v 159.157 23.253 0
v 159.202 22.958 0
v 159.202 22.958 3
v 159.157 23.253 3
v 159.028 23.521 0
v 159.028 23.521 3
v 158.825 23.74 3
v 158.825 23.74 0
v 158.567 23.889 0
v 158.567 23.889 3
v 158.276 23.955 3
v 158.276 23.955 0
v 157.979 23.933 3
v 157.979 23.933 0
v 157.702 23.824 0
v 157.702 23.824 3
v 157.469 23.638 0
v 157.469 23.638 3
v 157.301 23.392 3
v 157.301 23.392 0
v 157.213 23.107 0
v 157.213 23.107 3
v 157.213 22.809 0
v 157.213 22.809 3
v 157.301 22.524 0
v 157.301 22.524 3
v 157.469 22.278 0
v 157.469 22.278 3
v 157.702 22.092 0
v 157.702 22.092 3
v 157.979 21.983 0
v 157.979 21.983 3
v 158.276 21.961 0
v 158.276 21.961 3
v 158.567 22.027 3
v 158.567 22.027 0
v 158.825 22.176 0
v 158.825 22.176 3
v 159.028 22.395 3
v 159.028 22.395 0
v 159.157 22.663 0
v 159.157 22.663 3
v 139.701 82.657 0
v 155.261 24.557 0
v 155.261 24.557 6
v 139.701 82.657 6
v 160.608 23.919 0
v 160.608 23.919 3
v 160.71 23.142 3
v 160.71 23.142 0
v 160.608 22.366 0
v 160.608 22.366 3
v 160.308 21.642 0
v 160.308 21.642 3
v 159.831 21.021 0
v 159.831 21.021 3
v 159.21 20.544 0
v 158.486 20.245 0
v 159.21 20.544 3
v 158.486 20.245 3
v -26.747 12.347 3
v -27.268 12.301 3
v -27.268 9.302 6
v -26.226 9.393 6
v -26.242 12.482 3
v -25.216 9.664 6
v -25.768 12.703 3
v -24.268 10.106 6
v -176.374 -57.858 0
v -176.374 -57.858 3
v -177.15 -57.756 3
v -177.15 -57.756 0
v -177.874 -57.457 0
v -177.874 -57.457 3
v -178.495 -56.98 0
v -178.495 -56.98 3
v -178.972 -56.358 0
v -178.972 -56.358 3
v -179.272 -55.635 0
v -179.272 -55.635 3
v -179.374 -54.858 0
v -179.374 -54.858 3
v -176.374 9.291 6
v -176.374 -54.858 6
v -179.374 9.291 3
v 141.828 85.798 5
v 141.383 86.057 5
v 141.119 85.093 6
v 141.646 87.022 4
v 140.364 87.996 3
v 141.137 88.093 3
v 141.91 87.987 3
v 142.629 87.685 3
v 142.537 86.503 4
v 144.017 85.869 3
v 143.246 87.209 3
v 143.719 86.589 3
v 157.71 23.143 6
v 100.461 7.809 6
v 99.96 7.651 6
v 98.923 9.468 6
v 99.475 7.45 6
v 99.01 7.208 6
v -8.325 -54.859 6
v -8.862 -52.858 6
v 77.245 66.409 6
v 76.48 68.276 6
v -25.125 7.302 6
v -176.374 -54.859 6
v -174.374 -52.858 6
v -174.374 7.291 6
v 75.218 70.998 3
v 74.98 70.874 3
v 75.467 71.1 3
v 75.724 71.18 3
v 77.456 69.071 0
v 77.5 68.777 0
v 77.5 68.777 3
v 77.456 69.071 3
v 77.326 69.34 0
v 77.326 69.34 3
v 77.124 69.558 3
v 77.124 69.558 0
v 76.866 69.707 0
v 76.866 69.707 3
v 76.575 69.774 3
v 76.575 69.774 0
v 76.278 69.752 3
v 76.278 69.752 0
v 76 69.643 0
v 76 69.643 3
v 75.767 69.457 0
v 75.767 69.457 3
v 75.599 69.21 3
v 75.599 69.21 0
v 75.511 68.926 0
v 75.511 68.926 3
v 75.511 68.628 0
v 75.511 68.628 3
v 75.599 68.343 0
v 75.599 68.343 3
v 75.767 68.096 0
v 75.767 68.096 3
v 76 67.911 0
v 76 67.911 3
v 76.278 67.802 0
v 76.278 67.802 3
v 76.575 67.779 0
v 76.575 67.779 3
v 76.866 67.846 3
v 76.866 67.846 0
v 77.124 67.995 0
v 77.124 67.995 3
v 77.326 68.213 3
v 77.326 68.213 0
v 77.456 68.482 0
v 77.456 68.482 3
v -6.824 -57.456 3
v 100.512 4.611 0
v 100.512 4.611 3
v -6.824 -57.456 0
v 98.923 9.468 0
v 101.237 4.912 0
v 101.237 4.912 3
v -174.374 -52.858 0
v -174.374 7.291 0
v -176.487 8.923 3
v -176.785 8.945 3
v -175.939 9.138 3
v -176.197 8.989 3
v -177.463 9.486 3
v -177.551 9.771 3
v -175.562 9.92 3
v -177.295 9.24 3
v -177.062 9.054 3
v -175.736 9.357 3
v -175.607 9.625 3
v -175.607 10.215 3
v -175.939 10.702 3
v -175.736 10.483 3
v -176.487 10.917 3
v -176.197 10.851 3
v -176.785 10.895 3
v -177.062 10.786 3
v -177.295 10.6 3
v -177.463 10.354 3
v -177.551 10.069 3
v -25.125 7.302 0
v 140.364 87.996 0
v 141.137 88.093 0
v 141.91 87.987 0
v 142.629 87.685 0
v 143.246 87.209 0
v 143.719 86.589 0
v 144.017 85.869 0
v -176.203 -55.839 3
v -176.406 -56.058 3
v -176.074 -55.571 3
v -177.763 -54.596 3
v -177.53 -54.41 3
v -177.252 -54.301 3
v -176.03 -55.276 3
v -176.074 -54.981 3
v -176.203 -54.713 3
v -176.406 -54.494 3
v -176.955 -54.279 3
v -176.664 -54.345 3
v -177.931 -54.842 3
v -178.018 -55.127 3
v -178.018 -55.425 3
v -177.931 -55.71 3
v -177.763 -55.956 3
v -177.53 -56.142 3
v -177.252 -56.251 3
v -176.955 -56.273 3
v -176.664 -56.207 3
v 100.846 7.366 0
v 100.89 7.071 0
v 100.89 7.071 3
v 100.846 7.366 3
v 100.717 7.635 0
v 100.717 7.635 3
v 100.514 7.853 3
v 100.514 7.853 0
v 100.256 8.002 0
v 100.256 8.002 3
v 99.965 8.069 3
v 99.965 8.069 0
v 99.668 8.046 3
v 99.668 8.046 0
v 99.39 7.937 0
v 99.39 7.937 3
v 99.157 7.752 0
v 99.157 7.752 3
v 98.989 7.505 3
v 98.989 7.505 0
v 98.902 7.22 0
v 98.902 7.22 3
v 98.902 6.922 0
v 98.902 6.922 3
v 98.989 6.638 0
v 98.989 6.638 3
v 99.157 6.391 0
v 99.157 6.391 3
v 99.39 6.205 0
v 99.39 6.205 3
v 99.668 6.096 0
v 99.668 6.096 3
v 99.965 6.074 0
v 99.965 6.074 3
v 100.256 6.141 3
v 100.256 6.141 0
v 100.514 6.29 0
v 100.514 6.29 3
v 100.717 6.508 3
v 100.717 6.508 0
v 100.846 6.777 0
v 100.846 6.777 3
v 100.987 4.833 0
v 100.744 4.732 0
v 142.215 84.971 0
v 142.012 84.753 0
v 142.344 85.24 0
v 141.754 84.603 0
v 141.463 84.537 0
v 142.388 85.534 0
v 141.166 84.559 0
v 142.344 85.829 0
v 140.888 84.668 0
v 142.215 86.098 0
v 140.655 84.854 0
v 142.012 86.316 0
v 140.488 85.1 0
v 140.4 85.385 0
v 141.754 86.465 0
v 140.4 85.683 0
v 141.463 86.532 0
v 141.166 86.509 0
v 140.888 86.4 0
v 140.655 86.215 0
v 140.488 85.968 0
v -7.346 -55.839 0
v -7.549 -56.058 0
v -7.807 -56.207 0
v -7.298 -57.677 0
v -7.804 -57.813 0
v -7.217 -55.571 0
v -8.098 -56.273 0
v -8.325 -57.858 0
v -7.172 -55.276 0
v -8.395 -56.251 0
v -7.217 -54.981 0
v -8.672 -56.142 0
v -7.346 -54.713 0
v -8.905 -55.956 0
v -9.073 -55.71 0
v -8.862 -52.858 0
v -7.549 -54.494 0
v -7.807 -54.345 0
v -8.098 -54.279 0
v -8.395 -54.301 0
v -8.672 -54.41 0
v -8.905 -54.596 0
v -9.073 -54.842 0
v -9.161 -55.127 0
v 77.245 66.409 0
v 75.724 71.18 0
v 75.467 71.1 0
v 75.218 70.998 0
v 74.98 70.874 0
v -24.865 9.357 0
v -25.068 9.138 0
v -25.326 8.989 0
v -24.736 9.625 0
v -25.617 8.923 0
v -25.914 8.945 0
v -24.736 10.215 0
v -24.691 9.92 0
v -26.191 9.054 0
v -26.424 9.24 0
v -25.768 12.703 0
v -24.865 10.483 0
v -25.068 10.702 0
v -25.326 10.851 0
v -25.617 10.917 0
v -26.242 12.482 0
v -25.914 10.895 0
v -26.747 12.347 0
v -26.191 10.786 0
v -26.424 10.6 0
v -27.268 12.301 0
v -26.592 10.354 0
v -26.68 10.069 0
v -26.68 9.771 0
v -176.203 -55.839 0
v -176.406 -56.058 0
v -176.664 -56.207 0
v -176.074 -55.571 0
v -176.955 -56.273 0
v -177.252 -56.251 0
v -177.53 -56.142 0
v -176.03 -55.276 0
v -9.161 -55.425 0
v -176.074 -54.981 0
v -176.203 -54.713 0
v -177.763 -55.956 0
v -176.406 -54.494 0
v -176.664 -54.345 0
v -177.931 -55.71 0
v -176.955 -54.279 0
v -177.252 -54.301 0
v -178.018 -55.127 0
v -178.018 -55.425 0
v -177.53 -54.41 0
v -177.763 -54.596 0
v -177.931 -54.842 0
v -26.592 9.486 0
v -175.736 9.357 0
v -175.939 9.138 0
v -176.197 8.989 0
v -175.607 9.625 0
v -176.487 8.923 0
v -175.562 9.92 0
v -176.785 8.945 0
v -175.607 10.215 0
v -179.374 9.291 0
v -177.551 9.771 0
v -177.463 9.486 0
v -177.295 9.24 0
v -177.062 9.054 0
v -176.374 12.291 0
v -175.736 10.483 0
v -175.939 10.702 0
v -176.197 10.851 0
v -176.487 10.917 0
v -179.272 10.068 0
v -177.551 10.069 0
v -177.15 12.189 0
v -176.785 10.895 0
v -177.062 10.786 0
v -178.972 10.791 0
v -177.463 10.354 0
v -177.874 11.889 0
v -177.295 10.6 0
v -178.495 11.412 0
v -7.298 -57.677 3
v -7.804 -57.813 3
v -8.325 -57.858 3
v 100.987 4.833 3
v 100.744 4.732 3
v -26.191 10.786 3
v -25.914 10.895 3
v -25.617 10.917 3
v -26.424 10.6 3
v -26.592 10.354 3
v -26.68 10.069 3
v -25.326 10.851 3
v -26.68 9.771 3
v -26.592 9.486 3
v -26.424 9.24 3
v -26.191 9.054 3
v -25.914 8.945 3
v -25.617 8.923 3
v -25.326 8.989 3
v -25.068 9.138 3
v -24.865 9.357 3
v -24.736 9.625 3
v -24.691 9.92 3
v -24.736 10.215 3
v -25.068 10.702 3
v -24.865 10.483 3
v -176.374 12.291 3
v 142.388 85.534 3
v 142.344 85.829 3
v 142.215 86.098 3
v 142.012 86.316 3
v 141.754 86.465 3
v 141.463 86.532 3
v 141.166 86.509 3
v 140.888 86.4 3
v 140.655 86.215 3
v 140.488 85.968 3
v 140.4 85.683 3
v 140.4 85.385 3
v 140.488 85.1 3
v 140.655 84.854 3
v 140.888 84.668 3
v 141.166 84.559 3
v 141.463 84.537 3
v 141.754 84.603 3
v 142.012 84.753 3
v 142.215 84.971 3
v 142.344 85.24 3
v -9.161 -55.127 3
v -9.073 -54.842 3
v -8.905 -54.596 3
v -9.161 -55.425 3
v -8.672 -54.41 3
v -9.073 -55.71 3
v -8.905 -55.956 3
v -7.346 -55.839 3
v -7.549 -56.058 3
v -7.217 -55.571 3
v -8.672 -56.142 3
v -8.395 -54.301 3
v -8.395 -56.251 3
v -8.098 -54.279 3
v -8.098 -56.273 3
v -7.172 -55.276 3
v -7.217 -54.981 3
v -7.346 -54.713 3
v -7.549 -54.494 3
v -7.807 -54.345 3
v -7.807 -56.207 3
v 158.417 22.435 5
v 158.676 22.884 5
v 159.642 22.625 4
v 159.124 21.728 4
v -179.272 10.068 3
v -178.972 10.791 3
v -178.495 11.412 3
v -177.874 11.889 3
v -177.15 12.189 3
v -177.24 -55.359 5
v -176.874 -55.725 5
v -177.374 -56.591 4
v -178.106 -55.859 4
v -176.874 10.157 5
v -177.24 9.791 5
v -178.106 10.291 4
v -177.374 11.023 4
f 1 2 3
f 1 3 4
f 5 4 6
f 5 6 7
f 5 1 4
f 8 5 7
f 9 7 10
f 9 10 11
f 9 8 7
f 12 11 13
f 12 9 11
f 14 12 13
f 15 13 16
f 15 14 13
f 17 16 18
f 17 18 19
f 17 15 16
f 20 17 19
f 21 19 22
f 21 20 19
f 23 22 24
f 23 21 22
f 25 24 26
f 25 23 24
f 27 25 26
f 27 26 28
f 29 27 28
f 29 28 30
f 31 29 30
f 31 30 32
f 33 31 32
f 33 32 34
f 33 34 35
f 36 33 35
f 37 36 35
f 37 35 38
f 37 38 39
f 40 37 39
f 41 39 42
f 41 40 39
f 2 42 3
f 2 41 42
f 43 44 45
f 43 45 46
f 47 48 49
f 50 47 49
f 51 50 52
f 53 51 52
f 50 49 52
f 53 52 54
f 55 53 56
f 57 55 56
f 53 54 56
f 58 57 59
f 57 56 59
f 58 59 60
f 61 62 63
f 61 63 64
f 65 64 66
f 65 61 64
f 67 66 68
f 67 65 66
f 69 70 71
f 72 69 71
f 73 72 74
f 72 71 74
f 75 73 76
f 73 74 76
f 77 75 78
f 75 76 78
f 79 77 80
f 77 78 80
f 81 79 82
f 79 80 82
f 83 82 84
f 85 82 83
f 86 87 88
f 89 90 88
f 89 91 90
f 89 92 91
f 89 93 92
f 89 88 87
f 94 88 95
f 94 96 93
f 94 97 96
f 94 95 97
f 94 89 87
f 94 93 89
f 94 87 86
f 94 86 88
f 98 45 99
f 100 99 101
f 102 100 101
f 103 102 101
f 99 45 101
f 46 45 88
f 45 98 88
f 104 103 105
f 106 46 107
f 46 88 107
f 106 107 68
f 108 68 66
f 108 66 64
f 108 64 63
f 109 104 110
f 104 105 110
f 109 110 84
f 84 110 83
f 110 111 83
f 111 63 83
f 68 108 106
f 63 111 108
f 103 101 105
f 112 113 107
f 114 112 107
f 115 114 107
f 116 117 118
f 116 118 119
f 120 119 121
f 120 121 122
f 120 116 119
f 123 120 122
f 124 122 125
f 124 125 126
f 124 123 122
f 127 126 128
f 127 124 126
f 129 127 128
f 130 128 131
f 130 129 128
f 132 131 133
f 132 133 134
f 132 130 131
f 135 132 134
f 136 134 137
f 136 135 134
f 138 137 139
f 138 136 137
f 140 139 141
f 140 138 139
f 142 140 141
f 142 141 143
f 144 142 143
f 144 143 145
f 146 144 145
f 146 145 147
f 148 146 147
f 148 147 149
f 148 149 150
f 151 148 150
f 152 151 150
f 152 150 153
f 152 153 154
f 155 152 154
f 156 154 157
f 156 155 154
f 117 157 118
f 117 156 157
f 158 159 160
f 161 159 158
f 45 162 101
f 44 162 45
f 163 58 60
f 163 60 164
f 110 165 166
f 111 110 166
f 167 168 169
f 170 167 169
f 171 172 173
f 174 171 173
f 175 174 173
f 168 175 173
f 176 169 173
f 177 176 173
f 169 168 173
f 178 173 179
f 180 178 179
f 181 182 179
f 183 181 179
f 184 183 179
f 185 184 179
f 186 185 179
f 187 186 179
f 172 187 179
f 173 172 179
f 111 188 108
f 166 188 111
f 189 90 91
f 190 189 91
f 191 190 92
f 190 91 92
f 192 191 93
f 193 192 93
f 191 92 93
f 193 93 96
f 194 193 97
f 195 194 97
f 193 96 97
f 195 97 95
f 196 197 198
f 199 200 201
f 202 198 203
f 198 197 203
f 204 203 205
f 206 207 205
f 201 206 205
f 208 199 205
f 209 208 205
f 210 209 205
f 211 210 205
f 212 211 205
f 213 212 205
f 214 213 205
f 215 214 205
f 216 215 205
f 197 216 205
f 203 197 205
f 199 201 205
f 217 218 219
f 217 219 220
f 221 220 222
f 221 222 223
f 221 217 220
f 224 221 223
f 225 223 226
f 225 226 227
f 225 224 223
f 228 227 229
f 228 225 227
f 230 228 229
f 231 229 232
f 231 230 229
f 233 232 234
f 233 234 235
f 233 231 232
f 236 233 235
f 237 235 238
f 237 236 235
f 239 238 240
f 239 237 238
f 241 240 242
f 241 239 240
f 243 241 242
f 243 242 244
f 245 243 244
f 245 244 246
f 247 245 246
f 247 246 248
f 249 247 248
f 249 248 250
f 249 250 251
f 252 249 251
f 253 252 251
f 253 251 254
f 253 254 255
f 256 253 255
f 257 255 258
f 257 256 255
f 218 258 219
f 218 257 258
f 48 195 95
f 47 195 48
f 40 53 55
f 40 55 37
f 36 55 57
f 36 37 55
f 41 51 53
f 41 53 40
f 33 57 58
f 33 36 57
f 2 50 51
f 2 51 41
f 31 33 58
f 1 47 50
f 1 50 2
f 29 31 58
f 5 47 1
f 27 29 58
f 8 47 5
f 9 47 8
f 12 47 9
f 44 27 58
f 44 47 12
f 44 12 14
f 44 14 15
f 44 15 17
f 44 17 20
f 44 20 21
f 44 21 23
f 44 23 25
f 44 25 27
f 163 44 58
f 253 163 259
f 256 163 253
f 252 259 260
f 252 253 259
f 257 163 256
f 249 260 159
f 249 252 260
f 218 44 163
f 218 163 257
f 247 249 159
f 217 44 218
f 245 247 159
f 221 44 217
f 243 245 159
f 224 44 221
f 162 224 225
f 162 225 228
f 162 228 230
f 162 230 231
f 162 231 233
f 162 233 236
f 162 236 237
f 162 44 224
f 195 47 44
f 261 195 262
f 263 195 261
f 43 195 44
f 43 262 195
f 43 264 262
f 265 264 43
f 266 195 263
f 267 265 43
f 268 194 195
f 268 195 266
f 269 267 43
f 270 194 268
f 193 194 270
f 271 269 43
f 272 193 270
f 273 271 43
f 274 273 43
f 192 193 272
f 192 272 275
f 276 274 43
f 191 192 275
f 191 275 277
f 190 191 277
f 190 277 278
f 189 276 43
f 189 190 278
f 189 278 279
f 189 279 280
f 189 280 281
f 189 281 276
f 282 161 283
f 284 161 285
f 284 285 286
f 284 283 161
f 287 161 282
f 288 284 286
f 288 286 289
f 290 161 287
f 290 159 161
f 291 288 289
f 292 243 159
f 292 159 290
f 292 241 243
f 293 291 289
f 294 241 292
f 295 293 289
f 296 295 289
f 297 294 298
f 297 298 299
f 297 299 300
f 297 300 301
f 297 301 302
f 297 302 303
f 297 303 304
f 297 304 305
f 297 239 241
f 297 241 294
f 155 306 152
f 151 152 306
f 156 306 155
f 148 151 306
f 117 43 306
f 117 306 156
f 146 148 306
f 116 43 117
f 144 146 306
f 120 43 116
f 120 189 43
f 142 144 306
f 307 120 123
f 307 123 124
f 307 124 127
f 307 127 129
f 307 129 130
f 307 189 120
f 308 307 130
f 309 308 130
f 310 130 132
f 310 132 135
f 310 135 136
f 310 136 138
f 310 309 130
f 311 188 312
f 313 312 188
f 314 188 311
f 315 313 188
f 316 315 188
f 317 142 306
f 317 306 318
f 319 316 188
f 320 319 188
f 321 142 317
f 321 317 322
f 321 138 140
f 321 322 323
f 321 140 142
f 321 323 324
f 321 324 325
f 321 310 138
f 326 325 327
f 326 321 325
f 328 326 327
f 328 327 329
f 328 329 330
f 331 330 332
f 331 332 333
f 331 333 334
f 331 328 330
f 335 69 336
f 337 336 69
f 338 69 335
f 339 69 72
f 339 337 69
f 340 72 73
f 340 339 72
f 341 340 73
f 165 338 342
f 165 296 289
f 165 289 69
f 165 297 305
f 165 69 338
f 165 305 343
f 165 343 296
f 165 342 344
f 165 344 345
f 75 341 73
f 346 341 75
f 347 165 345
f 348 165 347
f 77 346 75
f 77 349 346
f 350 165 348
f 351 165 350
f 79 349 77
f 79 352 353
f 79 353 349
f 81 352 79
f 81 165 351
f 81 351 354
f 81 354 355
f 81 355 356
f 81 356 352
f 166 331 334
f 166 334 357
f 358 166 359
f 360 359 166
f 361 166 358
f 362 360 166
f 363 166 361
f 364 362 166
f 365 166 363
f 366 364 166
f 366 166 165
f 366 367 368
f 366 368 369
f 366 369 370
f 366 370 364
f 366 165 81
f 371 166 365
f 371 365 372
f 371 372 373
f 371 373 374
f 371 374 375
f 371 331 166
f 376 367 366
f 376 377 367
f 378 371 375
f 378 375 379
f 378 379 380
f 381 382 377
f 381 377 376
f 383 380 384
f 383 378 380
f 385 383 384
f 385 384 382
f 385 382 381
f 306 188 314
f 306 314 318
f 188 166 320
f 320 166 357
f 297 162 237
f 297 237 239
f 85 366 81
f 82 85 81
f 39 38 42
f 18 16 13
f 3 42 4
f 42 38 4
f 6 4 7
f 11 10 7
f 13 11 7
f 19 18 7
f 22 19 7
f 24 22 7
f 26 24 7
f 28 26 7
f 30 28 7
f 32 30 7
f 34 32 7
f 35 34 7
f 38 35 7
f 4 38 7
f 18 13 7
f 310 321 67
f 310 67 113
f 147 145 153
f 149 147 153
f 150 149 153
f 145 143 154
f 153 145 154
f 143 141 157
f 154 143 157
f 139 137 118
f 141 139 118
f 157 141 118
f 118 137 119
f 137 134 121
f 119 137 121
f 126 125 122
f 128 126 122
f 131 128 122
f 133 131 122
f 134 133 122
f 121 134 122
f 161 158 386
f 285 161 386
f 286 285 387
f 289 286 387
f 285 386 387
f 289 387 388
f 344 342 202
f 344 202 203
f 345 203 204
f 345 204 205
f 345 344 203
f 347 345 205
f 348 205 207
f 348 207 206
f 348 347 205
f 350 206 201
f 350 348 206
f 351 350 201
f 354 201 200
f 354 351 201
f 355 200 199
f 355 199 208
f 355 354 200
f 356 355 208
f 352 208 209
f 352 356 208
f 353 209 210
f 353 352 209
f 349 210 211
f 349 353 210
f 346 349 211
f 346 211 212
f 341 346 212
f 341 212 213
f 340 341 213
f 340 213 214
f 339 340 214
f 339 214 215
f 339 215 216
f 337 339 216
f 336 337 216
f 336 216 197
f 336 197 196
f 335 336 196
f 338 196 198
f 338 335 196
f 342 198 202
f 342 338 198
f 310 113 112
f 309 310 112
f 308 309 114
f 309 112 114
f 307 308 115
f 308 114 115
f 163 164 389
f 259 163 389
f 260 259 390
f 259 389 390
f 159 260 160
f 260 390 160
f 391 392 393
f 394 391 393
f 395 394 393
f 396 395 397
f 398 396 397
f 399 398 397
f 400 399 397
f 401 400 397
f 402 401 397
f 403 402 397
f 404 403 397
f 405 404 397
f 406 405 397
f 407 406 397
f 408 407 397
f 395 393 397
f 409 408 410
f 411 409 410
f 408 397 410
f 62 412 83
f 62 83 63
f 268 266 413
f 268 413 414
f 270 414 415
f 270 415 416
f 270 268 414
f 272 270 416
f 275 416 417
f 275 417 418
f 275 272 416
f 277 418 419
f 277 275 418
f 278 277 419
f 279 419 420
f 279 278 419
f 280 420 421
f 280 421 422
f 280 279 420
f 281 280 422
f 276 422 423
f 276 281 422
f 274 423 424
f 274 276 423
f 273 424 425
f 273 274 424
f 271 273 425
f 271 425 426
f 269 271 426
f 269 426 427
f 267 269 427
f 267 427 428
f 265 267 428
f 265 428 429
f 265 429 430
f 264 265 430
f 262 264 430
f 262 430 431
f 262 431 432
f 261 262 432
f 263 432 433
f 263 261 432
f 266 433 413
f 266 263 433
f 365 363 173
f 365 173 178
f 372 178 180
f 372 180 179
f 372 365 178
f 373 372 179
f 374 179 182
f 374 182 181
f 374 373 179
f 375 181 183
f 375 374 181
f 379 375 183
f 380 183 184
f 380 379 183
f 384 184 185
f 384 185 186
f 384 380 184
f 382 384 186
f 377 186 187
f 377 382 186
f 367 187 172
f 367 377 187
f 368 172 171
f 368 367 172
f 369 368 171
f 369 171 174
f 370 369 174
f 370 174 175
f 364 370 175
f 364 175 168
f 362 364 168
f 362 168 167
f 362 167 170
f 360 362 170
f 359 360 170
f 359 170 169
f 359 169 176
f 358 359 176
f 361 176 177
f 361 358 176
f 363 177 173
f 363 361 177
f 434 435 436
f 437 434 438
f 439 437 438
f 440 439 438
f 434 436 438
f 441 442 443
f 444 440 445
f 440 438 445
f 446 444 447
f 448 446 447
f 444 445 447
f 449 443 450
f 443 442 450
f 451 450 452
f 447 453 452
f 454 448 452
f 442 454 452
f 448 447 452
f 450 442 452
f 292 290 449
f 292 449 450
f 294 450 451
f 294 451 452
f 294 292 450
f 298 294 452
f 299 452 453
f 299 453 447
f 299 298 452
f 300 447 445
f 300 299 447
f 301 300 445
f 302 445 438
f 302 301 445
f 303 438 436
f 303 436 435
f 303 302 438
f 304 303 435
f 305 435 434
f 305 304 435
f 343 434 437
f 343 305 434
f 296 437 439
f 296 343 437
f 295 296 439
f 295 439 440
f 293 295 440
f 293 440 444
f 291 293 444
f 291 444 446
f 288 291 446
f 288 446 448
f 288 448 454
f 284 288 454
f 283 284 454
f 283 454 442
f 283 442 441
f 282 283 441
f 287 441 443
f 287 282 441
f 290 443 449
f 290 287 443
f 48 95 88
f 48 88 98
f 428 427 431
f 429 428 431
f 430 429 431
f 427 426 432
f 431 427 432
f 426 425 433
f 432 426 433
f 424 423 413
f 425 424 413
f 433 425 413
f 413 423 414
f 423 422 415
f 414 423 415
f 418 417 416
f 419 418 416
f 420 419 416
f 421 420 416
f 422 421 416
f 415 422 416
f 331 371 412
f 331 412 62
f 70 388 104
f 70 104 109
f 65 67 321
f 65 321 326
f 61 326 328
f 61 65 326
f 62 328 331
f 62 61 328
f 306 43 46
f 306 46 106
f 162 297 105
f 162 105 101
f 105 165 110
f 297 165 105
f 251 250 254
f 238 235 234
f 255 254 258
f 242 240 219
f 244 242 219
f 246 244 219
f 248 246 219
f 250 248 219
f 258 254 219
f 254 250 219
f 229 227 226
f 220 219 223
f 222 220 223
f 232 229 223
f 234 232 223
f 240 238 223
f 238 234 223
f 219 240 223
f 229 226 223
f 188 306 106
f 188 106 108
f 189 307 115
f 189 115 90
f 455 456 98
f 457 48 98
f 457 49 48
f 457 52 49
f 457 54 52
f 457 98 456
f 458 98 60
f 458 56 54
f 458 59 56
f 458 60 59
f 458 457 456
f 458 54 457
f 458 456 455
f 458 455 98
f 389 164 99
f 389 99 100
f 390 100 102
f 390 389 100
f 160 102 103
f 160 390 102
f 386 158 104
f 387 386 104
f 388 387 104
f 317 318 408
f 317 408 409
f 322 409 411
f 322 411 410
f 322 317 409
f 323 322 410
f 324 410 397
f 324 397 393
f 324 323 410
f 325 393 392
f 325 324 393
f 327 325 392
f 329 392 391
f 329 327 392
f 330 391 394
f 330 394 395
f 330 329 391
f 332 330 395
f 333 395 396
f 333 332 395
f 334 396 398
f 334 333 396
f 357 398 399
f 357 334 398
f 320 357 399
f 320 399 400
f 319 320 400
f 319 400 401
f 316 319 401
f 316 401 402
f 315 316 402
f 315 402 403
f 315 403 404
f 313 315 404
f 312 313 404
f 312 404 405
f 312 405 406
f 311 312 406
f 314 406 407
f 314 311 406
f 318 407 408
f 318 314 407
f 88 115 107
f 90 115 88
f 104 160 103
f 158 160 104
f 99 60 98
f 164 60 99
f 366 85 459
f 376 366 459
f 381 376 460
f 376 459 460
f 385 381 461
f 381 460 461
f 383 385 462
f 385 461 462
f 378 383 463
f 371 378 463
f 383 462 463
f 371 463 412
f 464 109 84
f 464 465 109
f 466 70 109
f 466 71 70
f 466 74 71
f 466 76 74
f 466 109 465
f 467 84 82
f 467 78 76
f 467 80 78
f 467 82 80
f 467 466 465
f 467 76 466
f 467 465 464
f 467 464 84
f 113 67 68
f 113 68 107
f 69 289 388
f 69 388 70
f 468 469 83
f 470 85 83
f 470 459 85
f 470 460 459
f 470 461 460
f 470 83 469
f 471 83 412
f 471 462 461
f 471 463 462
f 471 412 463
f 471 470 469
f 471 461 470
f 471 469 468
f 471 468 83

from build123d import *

# Parameters (mm, degrees)
BOSS_EXTRU_1_DEPTH      = 6
CONG_1_R                = 3
ESQUISSE2_R             = 1
ENL_V_MAT_EXTRU_1_DEPTH = 3
CHANFREIN1_SIZE         = 3


with BuildPart() as part:
    # Esquisse1 → Boss.-Extru.1 (new body)
    with BuildSketch(Plane.XY):
        Polygon((-26.464533767, 12.30154537), (75.33141454, 71.077500491), (143.246352653, 88.745859712), (161.383942986, 21.020985262), (100.854480283, 4.809102496), (-7.520422715, -57.858487698), (-179.373873722, -57.858487698), (-179.373873722, -50.687645053), (-179.373873722, 12.291034855), align=None)
        Polygon((-25.124548608, 7.301637465), (-174.373873722, 7.291378528), (-174.373873722, -50.687645053), (-174.373873722, -52.858487698), (-8.861972593, -52.858487698), (98.923133978, 9.468053786), (155.26069475, 24.557200291), (139.700811798, 82.657041562), (77.245358051, 66.408990356), align=None, mode=Mode.SUBTRACT)
    extrude(amount=BOSS_EXTRU_1_DEPTH)

    # Congé1
    cong_1_edges = [part.edges().sort_by_distance(p)[0] for p in [
        (75.33141454, 71.077500491, 3),
        (143.246352653, 88.745859712, 3),
        (161.383942986, 21.020985262, 3),
        (100.854480283, 4.809102496, 3),
        (-7.520422715, -57.858487698, 3),
        (-179.373873722, -57.858487698, 3),
        (-179.373873722, 12.291034855, 3),
        (-26.464533767, 12.30154537, 3),
    ]]
    fillet(cong_1_edges, radius=CONG_1_R)

    # Esquisse2 → Enlèv. mat.-Extru.1 (cut)
    with BuildSketch(Plane.XY):
        with Locations((158.201617013, 22.958080812)):
            Circle(ESQUISSE2_R)
        with Locations((141.388472611, 85.534334234)):
            Circle(ESQUISSE2_R)
        with Locations((76.500226548, 68.776582274)):
            Circle(ESQUISSE2_R)
        with Locations((99.890442316, 7.071415488)):
            Circle(ESQUISSE2_R)
        with Locations((-8.172352823, -55.275906246)):
            Circle(ESQUISSE2_R)
        with Locations((-25.691359515, 9.920090126)):
            Circle(ESQUISSE2_R)
        with Locations((-176.562127678, 9.920090126)):
            Circle(ESQUISSE2_R)
        with Locations((-177.029598341, -55.275906246)):
            Circle(ESQUISSE2_R)
    extrude(amount=ENL_V_MAT_EXTRU_1_DEPTH, mode=Mode.SUBTRACT)

    # Chanfrein1
    chanfrein1_edges = [part.edges().sort_by_distance(p)[0] for p in [
        (-92.349613182, -57.858487698, 6),
        (-179.373873722, -22.78362332, 6),
        (24.605627892, 41.788942262, 6),
        (-101.821199292, 12.296365586, 6),
        (46.843967712, -26.422377988, 6),
        (129.861641055, 12.578223, 6),
        (152.312387337, 54.893729991, 6),
        (108.044083383, 79.587840046, 6),
        (-178.495266971, 11.412488494, 6),
        (75.341794938, 71.05218052, 6),
        (142.628648998, 87.685066626, 6),
        (160.307894606, 21.642410085, 6),
        (-7.547920203, -57.756003669, 6),
        (-178.495194066, -56.979808041, 6),
        (100.86445313, 4.78504518, 6),
        (-26.491925042, 12.40375087, 6),
    ]]
    chamfer(chanfrein1_edges, length=CHANFREIN1_SIZE - 0.0001)  # a hair under: the kernel refuses the full size


solid = part.part
